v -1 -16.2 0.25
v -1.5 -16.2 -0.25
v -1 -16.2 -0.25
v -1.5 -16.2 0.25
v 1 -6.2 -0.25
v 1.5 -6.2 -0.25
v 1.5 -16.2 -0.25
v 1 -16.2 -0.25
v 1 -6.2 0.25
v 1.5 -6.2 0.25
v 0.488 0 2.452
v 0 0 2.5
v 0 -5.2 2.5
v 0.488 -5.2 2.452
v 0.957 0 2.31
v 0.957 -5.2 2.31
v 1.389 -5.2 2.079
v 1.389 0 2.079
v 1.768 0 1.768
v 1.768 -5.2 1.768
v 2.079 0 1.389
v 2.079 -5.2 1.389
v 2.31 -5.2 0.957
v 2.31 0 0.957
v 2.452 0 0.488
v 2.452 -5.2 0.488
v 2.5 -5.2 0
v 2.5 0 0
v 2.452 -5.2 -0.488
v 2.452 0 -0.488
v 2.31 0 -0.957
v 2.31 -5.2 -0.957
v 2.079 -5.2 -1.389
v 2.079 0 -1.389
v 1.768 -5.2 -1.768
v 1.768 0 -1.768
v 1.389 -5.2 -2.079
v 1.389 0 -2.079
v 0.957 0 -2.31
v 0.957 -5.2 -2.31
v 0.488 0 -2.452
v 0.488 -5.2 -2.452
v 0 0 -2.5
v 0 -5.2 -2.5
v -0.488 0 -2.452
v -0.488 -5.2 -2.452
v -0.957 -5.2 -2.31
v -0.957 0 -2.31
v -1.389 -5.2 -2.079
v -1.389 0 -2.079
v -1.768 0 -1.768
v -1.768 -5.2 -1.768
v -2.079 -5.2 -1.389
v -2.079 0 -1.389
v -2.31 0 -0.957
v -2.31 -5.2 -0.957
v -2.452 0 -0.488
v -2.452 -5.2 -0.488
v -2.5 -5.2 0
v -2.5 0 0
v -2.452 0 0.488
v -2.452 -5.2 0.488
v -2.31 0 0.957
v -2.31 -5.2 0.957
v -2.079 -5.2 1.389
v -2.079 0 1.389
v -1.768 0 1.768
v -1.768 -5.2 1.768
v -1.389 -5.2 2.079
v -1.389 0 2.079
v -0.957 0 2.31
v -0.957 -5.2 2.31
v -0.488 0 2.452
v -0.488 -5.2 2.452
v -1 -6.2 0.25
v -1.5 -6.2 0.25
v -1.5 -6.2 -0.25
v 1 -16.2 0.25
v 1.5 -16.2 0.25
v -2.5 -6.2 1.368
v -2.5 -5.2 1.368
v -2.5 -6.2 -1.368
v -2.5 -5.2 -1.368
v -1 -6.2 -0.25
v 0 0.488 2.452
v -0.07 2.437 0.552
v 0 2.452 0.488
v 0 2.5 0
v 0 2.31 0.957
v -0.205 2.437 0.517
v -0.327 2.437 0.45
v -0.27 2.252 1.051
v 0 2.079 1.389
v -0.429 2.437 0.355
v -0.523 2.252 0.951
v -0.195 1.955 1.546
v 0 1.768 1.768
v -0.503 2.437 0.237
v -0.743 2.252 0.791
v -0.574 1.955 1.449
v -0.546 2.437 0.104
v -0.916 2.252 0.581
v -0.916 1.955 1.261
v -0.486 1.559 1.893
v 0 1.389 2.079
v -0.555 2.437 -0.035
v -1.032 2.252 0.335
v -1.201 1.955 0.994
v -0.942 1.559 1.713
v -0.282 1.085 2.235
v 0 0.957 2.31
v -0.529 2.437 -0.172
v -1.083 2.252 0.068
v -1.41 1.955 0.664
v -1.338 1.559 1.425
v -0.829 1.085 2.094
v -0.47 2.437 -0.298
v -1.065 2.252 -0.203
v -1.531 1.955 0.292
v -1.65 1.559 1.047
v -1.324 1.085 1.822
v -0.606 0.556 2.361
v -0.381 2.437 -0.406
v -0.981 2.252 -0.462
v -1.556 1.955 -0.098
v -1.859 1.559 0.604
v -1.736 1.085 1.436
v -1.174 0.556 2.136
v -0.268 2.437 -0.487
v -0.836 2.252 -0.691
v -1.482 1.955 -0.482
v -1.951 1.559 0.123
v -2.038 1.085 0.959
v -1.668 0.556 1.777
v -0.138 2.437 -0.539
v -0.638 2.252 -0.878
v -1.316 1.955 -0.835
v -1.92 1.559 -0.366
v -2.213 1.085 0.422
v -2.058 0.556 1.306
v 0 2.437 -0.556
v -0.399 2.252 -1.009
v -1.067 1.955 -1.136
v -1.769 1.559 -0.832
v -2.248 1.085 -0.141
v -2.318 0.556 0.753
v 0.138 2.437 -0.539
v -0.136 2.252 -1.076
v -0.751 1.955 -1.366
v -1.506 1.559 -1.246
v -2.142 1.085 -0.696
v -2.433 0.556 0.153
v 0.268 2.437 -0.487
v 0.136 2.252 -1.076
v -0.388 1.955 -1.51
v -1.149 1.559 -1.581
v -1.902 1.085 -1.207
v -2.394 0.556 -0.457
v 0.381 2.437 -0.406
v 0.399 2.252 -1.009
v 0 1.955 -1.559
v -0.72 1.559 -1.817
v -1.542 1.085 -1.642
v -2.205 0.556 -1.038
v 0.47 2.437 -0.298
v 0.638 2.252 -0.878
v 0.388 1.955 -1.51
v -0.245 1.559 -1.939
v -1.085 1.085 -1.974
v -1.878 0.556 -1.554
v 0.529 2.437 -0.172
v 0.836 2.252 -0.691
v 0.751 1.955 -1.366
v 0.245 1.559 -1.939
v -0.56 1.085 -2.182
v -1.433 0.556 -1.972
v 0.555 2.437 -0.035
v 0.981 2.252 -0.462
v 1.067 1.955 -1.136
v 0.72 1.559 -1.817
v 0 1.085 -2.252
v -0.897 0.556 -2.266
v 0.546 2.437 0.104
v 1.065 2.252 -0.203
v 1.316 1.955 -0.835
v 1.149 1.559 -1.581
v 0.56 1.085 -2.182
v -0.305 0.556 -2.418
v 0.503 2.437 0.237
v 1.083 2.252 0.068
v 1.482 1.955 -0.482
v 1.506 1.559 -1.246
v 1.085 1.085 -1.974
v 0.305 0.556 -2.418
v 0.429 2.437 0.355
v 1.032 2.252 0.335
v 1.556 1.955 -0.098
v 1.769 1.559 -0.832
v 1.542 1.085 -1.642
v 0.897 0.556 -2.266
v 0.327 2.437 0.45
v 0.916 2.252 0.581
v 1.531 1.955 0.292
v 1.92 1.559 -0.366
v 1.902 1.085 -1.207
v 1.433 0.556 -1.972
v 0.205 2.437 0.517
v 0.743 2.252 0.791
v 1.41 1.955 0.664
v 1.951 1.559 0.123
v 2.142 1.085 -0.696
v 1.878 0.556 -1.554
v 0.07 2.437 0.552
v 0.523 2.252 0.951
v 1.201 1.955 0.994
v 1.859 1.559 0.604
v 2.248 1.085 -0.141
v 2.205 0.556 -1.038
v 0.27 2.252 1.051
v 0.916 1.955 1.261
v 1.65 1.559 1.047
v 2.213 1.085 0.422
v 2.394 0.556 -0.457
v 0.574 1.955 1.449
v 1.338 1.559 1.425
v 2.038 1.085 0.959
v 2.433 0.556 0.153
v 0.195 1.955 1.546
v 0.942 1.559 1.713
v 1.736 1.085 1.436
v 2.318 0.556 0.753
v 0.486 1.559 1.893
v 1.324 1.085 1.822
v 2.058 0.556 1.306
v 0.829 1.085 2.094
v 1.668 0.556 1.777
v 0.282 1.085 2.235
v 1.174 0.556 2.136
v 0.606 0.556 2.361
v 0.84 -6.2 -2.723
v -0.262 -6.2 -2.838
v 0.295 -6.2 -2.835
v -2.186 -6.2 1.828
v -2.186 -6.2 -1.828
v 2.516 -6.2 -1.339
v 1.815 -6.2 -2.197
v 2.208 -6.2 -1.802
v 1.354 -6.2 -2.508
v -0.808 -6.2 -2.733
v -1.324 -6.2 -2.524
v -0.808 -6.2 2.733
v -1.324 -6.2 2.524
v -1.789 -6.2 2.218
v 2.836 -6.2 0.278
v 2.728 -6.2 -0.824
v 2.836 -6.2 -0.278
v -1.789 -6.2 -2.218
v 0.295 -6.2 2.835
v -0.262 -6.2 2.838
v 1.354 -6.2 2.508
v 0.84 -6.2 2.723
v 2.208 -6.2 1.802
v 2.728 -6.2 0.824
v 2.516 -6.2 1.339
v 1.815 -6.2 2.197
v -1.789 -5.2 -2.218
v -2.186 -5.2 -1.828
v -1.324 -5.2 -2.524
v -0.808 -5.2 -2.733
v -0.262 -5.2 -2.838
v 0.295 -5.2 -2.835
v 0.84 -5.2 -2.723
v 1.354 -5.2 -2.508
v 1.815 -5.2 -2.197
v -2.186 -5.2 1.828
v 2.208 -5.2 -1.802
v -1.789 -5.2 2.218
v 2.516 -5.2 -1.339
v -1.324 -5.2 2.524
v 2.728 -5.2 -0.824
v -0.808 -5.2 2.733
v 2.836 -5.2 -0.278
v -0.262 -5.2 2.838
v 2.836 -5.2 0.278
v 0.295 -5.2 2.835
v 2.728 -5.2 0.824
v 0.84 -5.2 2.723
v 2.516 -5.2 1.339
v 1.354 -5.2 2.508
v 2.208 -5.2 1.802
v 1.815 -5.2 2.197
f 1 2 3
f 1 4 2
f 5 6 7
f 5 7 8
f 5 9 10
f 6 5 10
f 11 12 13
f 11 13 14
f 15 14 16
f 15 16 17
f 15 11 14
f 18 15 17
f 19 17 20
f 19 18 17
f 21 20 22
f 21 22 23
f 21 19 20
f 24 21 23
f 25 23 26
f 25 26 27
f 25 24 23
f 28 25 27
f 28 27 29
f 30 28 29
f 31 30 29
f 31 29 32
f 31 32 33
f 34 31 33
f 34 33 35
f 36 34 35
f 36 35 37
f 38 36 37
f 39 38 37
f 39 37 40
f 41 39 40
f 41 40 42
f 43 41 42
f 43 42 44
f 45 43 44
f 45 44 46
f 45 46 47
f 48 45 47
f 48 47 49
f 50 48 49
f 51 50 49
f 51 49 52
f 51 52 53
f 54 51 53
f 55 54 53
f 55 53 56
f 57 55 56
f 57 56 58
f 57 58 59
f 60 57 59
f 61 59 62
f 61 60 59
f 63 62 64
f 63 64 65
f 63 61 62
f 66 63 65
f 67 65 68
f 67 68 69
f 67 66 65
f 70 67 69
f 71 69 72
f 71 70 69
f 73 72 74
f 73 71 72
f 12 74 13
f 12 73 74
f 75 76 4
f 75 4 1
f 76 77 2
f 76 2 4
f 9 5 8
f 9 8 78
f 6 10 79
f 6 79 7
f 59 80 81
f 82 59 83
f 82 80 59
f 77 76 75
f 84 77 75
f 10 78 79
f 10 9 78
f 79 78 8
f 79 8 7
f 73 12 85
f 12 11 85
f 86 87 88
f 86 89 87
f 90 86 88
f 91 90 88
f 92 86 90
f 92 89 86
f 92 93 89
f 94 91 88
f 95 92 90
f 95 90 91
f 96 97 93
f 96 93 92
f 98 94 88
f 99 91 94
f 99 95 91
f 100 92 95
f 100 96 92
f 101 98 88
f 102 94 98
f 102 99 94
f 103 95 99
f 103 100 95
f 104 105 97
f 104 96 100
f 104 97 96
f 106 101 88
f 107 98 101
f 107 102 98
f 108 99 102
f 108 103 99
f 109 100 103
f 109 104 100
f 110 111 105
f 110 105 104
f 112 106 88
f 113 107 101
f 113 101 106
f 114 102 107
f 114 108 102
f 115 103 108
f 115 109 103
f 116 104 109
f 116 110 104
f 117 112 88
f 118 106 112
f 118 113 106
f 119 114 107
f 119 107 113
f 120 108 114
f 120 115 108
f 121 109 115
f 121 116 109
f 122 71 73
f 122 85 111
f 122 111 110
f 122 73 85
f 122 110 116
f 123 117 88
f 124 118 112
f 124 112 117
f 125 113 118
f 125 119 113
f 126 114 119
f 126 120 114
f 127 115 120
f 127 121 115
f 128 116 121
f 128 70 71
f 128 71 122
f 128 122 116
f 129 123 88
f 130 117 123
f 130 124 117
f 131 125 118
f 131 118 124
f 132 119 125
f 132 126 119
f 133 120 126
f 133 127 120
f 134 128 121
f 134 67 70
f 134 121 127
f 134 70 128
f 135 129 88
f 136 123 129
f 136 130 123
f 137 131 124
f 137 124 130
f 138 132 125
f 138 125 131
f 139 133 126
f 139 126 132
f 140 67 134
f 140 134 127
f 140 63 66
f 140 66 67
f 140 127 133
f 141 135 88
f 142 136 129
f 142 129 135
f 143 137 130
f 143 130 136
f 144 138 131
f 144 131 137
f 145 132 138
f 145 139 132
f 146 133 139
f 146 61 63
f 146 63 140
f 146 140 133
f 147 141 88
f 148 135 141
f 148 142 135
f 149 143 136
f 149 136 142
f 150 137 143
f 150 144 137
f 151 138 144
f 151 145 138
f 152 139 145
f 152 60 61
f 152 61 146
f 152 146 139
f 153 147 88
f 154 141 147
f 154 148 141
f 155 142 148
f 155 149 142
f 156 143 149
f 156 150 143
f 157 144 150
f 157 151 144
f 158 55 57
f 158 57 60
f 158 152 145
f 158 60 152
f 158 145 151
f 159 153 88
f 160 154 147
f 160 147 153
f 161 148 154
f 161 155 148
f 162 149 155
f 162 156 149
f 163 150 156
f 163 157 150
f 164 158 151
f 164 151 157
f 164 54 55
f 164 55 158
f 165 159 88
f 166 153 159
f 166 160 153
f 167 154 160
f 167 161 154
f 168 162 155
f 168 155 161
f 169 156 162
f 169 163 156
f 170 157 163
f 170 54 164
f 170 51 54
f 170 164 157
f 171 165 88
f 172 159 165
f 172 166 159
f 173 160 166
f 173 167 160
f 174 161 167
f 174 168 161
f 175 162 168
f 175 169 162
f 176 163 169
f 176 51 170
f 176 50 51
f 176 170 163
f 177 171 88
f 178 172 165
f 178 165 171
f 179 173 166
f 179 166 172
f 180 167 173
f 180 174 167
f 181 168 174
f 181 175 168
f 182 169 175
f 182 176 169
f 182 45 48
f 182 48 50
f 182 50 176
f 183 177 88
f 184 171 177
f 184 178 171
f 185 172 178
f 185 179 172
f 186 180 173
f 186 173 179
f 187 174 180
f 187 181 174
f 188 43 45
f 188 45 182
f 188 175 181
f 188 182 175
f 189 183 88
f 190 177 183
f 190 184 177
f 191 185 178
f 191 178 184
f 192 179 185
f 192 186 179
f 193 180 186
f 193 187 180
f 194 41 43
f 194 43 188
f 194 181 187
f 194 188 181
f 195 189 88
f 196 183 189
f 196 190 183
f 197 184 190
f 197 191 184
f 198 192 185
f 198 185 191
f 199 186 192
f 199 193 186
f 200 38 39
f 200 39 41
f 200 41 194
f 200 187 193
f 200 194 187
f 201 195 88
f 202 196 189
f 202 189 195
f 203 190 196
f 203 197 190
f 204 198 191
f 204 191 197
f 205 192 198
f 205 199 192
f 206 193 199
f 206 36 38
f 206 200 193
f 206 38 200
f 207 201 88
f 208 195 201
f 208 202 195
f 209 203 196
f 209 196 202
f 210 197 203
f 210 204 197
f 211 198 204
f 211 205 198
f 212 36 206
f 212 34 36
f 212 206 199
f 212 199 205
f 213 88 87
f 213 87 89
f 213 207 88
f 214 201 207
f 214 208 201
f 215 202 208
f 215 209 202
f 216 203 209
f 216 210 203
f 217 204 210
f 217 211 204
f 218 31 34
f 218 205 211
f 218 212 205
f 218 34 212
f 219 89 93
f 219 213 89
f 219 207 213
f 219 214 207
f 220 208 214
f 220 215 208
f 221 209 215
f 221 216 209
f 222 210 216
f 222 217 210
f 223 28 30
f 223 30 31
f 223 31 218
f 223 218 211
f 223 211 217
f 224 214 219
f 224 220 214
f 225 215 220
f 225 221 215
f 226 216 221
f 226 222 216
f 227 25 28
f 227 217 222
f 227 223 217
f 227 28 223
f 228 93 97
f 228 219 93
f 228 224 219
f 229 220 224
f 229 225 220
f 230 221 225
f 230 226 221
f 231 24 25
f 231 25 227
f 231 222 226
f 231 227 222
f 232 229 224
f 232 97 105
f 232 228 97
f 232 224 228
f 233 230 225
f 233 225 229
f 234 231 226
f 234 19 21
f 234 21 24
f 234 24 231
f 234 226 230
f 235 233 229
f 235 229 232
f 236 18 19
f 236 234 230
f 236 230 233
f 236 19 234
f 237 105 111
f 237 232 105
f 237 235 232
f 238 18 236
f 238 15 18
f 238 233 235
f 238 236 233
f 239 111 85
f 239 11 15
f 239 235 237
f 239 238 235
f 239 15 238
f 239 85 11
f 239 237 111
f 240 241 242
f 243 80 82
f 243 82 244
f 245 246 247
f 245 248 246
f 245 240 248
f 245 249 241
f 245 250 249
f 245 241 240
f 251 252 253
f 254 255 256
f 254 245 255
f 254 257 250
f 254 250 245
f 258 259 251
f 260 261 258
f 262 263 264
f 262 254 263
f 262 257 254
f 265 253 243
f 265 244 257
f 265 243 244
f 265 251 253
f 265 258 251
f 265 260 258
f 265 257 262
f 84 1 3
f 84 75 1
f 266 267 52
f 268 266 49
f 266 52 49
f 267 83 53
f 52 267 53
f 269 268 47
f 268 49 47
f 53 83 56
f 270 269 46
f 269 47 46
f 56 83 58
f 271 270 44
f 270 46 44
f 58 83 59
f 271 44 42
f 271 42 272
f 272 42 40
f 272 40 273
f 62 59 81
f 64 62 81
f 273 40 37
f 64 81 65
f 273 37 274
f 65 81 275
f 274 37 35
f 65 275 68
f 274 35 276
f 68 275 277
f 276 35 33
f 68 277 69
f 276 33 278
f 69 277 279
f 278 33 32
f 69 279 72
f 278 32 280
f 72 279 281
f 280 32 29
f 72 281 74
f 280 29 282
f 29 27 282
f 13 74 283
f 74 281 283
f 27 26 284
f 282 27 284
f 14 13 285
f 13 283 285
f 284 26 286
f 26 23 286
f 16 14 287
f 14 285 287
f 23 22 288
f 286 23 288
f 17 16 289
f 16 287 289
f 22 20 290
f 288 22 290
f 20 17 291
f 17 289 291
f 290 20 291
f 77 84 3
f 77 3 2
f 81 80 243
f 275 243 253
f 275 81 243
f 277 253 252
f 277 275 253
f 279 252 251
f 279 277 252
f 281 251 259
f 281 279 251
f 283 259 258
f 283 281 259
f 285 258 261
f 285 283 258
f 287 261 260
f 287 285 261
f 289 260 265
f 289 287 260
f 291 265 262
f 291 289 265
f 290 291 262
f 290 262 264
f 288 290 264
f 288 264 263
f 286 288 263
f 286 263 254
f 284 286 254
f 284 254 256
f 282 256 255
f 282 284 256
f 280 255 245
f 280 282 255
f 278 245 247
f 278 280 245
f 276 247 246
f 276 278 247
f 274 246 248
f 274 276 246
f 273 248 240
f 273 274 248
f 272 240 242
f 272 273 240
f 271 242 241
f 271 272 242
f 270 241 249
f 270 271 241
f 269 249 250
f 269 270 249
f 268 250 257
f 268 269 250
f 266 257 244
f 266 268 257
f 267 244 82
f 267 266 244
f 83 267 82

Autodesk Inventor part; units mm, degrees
ref_plane "YZ Plane" through (0, 0, 0) normal (1, 0, 0) x (0, 1, 0)
ref_plane "XZ Plane" through (0, 0, 0) normal (0, 1, 0) x (-1, 0, 0)
ref_plane "XY Plane" through (0, 0, 0) normal (0, 0, 1) x (1, 0, 0)
sketch "Sketch1" plane through (0, 0, 0) normal (1, 0, 0) x (0, 1, 0)
  arc A0 (2.5, 0) -> (0, 2.5) centre (0, 0) ccw
  line L0 (-5.2, 0) -> (-5.2, 2.5)
  line L1 (-5.2, 2.5) -> (0, 2.5)
  line L2 (-5.2, 0) -> (2.5, 0)
  dimension "d0" = 2.5
  dimension "d1" = 7.7
revolve "Revolution1" add sketch "Sketch1" angle 360 about axis through (0, -5.2, 0) along (0, 1, 0)
sketch "Sketch2" plane through (0, -5.2, 0) normal (0, -1, 0) x (1, 0, 0)
  circle A0 centre (0, 0) radius 2.85
  dimension "d3" = 5.7
extrude "Extrusion1" add sketch "Sketch2" along normal blind 1
sketch "Sketch3" plane through (0, -6.2, 0) normal (0, -1, 0) x (1, 0, 0)
  circle A0 centre (0, 0) radius 2.5 projected
  line L0 (-2.5, 1.3684) -> (-2.5, -1.3684)
  circle A1 centre (0, 0) radius 2.85 projected
extrude "Extrusion2" cut sketch "Sketch3" against normal up to surface (1 mm away) contours L0 A1 picked at (-2.5741, -0.7373)
sketch "Sketch4" plane through (0, -6.2, 0) normal (0, -1, 0) x (1, 0, 0)
  line L0 (1.5, -0.25) -> (1, -0.25)
  line L1 (1, -0.25) -> (1, 0.25)
  line L2 (1, 0.25) -> (1.5, 0.25)
  line L3 (1.5, 0.25) -> (1.5, -0.25)
  line L4 (1.5, -0.25) -> (1, 0.25) construction
  line L5 (1, -0.25) -> (1.5, 0.25) construction
  line L6 (-1, -0.25) -> (-1.5, -0.25)
  line L7 (-1.5, -0.25) -> (-1.5, 0.25)
  line L8 (-1.5, 0.25) -> (-1, 0.25)
  line L9 (-1, 0.25) -> (-1, -0.25)
  line L10 (-1, -0.25) -> (-1.5, 0.25) construction
  line L11 (-1.5, -0.25) -> (-1, 0.25) construction
  line L12 (0, 0) -> (0, -1.2379)
  line L13 (0, 0) -> (-2.5, 0)
  point P0 (1.25, 0)
  point P1 (-1.25, 0)
  point P2 (-1.25, 0)
  point P3 (1.25, 0)
  point P4 (-1.25, 0)
  dimension "d8" = 2.5
  dimension "d9" = 0.5
extrude "Extrusion3" add sketch "Sketch4" along normal blind 10 separate body
properties part number "OPE5594A"
